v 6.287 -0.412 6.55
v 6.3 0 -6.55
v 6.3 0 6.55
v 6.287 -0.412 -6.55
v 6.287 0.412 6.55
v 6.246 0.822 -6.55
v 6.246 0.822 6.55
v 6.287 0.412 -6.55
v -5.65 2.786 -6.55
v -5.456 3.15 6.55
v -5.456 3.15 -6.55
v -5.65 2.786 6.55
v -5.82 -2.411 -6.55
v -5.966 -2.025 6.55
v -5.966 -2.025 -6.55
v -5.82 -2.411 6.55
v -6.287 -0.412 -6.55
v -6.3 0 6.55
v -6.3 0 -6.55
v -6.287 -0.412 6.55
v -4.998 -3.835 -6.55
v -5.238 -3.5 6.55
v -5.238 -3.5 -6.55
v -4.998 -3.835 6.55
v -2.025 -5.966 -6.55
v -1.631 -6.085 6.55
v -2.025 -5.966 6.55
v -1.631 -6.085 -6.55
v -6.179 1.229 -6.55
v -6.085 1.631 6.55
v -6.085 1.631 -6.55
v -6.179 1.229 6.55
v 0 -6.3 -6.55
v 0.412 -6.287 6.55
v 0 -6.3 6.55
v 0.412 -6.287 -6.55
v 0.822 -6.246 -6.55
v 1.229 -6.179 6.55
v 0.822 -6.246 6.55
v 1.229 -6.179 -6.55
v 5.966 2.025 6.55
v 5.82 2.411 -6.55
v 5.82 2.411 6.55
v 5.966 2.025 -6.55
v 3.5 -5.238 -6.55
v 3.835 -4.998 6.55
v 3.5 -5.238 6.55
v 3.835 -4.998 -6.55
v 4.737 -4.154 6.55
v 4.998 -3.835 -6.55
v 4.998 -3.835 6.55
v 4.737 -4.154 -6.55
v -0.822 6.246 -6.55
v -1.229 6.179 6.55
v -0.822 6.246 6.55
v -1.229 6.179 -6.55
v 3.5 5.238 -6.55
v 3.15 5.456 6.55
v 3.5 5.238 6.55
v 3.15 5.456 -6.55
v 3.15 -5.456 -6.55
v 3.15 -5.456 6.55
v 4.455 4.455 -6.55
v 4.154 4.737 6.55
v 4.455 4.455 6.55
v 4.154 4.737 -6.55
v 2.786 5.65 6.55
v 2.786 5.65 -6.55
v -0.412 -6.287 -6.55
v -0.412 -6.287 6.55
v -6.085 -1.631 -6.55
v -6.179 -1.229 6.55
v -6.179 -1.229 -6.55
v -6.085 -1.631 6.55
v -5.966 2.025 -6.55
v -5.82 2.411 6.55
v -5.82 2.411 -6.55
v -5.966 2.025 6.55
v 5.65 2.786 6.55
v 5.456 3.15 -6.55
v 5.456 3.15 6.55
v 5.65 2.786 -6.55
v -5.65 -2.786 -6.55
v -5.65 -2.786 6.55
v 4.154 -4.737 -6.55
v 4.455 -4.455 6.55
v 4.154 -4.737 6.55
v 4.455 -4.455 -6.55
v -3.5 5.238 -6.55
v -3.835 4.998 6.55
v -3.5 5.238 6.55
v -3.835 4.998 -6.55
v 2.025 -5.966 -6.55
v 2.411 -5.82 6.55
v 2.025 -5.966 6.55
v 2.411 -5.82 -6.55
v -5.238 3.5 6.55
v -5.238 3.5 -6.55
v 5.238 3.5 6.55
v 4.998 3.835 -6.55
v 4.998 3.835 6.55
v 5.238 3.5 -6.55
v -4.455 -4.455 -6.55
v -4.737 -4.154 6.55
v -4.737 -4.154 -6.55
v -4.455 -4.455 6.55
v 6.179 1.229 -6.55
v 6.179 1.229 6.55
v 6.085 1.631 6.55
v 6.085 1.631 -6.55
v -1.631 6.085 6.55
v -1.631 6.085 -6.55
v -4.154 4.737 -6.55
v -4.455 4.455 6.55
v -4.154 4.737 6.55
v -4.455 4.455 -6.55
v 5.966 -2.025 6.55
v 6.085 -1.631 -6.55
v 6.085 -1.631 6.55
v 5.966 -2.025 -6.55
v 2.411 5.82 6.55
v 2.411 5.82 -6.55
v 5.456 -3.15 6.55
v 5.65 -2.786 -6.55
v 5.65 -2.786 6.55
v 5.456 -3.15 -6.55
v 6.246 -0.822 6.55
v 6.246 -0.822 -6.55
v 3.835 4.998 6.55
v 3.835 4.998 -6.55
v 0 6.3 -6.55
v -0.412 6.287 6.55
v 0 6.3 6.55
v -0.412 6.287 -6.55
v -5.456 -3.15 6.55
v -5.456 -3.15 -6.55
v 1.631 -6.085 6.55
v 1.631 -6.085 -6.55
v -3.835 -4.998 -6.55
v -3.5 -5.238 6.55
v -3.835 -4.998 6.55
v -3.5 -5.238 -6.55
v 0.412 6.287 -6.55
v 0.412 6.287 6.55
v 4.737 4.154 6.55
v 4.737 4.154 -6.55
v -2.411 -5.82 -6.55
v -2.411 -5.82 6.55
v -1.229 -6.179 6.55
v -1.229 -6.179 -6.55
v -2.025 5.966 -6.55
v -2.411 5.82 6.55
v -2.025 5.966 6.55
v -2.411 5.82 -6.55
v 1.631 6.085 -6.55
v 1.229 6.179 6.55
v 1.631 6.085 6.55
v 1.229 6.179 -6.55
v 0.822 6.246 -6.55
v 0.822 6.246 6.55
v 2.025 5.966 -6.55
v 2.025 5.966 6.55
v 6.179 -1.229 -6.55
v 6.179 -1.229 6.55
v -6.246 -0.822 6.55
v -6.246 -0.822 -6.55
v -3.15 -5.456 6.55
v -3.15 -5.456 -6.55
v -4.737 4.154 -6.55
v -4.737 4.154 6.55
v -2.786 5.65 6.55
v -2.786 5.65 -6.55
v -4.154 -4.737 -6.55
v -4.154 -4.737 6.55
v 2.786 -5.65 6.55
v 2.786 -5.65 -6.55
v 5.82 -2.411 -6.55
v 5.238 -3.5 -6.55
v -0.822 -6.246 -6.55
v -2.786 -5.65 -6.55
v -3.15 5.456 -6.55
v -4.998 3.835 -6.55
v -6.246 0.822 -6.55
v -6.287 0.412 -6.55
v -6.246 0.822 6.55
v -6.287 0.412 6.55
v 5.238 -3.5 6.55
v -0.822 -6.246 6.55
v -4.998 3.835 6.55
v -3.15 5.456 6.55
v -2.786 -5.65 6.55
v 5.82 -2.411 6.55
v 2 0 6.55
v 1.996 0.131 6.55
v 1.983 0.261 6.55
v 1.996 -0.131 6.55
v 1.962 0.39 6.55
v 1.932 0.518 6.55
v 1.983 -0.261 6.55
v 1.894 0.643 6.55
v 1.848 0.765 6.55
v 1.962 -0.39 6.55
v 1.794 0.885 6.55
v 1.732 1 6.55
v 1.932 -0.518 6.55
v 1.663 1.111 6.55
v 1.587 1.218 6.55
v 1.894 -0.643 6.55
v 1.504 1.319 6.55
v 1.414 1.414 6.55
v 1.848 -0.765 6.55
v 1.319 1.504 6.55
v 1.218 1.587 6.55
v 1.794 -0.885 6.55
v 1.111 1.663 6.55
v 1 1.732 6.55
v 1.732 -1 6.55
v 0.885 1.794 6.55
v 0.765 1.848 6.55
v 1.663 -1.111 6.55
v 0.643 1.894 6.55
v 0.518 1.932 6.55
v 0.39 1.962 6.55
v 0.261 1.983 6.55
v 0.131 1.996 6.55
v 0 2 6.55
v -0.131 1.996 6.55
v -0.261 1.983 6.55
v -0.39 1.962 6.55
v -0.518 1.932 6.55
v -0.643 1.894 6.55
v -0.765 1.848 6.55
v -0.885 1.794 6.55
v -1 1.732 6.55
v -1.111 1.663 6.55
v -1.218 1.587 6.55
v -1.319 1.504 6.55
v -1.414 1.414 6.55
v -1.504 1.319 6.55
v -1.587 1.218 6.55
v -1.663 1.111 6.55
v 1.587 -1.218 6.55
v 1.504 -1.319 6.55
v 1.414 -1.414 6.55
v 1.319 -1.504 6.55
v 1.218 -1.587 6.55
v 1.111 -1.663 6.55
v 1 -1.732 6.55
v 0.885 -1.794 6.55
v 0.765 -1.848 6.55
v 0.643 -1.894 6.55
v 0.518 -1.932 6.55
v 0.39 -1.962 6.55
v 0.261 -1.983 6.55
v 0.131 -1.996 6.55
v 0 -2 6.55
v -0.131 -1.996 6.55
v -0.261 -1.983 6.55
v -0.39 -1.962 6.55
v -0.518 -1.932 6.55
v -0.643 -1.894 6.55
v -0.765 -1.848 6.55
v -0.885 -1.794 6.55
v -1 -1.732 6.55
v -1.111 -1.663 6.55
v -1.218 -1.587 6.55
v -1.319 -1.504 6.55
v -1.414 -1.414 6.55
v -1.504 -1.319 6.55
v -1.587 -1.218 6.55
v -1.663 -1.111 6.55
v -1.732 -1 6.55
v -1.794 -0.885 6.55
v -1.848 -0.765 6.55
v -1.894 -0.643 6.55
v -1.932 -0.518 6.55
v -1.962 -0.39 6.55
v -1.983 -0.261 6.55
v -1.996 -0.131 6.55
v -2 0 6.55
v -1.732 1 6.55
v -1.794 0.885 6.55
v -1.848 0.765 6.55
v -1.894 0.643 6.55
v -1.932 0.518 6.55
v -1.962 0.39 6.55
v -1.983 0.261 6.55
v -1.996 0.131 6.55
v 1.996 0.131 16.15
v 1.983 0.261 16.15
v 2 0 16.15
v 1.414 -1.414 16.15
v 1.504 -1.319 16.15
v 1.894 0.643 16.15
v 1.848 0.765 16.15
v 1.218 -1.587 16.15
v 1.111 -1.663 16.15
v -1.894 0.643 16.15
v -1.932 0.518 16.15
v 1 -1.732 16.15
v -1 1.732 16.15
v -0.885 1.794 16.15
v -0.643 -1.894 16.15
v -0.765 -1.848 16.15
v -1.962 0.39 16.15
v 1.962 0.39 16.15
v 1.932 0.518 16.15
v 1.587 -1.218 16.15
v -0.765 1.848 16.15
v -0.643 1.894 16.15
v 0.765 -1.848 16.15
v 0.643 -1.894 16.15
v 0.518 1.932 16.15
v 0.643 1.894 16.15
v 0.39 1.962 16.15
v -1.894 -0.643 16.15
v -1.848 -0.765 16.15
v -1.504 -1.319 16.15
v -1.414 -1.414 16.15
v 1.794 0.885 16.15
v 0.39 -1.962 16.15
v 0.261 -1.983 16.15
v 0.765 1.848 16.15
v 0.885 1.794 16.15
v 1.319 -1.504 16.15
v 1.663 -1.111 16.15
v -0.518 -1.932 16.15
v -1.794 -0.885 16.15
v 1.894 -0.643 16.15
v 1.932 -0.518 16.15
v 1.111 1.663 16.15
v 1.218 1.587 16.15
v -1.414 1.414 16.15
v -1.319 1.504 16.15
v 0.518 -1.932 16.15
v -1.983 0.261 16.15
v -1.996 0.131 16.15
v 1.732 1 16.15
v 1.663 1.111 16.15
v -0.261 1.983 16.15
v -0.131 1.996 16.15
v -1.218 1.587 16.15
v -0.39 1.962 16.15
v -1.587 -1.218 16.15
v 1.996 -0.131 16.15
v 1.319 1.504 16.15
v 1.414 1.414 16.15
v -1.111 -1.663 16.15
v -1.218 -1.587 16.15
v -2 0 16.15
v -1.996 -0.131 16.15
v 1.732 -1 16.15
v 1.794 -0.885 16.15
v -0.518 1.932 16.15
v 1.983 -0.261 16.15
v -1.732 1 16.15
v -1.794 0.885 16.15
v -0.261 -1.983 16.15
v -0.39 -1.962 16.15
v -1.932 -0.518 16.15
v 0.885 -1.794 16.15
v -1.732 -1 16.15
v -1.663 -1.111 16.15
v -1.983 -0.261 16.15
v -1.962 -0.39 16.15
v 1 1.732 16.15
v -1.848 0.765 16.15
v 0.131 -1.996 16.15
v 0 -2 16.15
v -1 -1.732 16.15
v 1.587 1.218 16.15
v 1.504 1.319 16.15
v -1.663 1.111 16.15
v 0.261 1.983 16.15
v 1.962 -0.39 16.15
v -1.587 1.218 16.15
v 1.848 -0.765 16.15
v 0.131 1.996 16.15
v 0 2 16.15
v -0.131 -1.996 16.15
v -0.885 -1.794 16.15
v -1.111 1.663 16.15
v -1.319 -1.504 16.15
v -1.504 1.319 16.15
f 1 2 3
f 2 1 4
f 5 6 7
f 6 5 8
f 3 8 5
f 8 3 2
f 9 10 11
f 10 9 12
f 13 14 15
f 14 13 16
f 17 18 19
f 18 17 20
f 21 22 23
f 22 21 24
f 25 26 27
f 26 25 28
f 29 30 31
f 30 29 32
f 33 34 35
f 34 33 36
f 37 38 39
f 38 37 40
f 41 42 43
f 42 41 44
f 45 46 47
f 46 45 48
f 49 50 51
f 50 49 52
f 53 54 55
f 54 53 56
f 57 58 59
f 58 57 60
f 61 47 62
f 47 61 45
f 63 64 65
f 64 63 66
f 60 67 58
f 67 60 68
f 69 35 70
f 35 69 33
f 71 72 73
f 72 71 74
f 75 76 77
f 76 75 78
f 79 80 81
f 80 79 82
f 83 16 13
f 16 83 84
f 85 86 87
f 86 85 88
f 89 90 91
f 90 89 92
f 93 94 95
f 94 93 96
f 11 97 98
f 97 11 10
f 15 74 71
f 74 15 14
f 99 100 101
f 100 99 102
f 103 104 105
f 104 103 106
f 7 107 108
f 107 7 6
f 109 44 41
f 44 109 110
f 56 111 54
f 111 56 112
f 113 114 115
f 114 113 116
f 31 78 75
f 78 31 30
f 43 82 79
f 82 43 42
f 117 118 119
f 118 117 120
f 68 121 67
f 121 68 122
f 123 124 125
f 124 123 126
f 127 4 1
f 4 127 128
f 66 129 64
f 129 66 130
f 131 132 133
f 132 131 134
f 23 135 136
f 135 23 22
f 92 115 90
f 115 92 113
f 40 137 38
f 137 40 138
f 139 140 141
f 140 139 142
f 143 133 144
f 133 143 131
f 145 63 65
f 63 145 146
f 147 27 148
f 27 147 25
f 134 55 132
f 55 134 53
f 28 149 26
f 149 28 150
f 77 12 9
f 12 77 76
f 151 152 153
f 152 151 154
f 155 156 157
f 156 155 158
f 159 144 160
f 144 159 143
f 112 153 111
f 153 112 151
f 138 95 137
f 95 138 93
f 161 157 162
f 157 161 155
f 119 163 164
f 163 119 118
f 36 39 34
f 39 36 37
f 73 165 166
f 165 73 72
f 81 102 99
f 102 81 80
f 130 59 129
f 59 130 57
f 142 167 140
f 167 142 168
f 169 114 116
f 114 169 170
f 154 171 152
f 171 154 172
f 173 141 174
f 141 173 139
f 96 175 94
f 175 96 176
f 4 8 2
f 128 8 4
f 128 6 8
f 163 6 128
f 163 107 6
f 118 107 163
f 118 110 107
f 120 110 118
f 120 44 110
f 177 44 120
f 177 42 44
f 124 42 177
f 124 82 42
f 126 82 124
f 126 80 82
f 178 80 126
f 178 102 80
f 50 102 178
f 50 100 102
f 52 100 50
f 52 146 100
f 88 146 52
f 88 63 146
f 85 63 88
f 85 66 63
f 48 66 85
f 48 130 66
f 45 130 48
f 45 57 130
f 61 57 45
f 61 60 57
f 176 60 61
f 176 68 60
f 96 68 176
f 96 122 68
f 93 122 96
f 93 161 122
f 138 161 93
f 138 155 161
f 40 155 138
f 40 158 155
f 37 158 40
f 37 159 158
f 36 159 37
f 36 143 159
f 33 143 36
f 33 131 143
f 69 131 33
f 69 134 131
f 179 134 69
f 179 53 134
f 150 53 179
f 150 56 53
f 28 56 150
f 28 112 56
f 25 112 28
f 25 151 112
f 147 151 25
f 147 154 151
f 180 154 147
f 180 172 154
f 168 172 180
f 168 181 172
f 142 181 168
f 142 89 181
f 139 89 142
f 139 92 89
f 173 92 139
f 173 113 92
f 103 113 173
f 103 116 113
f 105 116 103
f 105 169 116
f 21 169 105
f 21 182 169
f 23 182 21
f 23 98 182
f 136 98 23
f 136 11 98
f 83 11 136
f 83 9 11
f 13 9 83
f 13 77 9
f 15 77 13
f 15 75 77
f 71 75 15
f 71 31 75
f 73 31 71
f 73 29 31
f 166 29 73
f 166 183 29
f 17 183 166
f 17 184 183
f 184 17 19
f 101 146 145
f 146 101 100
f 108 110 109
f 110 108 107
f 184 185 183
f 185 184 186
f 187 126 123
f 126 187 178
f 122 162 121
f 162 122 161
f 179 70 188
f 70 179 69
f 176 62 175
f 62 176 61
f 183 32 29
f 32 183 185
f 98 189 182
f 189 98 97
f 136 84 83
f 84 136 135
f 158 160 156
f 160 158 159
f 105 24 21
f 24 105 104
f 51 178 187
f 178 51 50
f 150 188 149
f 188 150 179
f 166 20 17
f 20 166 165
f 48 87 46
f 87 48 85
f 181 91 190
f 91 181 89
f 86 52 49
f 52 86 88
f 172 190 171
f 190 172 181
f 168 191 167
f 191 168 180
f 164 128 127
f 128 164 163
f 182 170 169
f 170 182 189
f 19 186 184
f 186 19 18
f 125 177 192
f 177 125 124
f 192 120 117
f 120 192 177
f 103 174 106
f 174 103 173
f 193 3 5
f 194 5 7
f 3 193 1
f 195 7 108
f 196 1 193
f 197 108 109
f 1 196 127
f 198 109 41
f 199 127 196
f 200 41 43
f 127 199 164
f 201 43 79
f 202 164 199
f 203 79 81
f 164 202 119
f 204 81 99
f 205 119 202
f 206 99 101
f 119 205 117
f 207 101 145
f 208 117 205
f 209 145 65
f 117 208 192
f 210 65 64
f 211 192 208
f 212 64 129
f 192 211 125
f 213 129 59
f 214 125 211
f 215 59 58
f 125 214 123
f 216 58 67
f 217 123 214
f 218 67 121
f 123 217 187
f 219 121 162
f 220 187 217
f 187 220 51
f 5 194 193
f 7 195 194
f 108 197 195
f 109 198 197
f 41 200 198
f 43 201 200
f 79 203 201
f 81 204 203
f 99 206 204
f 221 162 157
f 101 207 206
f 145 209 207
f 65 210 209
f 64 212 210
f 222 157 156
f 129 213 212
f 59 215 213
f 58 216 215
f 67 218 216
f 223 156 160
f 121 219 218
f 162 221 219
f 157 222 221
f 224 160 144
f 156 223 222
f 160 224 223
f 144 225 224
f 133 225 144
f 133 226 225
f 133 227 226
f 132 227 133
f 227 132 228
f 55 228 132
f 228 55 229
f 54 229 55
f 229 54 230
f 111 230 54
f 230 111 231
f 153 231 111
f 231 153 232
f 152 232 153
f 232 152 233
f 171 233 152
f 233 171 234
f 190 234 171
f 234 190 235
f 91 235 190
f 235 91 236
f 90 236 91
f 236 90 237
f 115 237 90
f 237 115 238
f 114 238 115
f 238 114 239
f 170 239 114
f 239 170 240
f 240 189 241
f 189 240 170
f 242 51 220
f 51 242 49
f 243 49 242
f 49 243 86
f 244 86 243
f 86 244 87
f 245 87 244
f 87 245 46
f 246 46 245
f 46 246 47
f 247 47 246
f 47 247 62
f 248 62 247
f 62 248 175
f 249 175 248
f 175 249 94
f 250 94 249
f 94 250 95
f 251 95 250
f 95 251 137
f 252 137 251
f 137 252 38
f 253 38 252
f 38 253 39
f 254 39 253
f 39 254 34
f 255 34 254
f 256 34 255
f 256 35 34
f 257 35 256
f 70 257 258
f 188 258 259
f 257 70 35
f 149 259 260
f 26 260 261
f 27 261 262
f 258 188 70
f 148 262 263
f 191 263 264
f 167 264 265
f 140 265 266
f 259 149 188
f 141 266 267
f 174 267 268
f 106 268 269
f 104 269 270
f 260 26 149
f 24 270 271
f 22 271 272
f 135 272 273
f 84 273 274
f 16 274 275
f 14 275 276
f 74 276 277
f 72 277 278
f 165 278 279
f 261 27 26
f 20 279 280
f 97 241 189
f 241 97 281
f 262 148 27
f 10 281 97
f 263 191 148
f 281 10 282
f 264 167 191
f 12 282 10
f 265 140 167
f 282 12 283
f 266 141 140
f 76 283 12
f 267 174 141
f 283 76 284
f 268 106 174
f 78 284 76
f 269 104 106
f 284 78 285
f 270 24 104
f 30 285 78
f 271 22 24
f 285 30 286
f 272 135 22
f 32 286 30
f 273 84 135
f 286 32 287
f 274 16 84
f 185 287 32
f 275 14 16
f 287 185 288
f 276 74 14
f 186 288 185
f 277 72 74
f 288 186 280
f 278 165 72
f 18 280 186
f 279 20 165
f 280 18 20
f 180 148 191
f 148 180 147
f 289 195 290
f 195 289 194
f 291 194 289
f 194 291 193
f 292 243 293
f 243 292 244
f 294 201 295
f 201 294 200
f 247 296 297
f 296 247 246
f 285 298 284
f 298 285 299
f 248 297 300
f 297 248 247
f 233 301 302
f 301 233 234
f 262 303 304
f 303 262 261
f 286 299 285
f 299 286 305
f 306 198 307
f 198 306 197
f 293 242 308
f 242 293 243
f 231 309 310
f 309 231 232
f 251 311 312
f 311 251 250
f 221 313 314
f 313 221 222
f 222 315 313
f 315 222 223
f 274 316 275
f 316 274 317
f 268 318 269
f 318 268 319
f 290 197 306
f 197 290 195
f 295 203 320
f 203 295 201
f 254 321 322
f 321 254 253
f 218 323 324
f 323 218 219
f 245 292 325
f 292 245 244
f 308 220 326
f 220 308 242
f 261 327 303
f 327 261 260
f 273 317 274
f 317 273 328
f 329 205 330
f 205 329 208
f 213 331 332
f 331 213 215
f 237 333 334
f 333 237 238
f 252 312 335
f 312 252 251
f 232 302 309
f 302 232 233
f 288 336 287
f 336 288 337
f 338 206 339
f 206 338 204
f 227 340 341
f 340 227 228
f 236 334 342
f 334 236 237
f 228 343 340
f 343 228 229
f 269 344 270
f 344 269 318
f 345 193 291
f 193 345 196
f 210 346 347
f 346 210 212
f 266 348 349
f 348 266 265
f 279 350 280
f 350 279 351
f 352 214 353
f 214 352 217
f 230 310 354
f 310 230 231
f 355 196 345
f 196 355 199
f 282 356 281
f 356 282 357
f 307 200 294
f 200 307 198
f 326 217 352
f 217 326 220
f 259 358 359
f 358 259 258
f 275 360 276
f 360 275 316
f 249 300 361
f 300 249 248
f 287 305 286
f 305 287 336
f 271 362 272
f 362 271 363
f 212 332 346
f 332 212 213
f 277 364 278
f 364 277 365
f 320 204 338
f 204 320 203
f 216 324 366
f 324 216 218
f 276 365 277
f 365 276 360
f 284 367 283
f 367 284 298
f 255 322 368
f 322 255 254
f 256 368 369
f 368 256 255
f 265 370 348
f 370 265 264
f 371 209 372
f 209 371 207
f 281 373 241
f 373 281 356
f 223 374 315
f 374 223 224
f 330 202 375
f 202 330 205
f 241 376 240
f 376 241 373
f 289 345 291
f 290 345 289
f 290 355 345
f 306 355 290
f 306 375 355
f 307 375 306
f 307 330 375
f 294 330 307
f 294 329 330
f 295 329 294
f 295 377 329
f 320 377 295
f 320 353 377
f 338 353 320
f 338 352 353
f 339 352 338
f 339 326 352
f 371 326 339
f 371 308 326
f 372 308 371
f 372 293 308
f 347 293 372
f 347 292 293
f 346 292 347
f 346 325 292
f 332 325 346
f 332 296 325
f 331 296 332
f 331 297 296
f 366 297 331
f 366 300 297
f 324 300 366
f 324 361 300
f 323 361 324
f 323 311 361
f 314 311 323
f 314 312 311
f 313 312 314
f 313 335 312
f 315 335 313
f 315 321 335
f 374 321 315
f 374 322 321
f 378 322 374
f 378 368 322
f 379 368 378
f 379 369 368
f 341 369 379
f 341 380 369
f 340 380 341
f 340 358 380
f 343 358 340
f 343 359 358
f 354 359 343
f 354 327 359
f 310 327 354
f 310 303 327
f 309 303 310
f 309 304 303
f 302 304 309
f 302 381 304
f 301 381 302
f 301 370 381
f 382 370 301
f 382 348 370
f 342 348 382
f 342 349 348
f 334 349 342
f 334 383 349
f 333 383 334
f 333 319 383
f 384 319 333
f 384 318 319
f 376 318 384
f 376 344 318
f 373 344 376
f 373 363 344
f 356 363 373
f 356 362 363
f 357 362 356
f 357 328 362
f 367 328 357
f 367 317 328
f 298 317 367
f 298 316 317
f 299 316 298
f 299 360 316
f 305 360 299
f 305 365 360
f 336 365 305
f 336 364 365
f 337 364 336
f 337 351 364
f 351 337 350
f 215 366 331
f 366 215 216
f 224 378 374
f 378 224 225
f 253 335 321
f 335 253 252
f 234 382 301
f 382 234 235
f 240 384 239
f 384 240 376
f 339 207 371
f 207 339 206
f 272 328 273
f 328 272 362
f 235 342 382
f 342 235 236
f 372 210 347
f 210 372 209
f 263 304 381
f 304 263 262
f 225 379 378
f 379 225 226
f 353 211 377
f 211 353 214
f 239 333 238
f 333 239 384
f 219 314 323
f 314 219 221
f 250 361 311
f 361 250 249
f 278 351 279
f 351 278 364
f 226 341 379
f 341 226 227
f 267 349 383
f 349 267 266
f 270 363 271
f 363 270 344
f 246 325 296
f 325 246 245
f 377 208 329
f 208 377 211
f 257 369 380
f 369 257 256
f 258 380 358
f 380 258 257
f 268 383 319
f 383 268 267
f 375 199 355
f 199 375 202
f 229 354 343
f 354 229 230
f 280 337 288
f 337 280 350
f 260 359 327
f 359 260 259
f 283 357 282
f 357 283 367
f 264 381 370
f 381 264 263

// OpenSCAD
$fn = 96;

// Parameters (mm)
outer_diameter = 12.6;   // body diameter
body_height    = 13.1;   // body height

toggle_diameter = 4;     // lever diameter
toggle_height   = 10;    // lever height above body

// Small overlap to guarantee a single connected solid
overlap = 0.4;

module toggle_switch() {
    union() {
        // Main cylindrical body (centered at origin)
        cylinder(h = body_height, d = outer_diameter, center = true);

        // Toggle lever: centered cylinder, positioned so it overlaps into the body
        translate([0, 0, body_height/2 + toggle_height/2 - overlap])
            cylinder(h = toggle_height, d = toggle_diameter, center = true);
    }
}

toggle_switch();
